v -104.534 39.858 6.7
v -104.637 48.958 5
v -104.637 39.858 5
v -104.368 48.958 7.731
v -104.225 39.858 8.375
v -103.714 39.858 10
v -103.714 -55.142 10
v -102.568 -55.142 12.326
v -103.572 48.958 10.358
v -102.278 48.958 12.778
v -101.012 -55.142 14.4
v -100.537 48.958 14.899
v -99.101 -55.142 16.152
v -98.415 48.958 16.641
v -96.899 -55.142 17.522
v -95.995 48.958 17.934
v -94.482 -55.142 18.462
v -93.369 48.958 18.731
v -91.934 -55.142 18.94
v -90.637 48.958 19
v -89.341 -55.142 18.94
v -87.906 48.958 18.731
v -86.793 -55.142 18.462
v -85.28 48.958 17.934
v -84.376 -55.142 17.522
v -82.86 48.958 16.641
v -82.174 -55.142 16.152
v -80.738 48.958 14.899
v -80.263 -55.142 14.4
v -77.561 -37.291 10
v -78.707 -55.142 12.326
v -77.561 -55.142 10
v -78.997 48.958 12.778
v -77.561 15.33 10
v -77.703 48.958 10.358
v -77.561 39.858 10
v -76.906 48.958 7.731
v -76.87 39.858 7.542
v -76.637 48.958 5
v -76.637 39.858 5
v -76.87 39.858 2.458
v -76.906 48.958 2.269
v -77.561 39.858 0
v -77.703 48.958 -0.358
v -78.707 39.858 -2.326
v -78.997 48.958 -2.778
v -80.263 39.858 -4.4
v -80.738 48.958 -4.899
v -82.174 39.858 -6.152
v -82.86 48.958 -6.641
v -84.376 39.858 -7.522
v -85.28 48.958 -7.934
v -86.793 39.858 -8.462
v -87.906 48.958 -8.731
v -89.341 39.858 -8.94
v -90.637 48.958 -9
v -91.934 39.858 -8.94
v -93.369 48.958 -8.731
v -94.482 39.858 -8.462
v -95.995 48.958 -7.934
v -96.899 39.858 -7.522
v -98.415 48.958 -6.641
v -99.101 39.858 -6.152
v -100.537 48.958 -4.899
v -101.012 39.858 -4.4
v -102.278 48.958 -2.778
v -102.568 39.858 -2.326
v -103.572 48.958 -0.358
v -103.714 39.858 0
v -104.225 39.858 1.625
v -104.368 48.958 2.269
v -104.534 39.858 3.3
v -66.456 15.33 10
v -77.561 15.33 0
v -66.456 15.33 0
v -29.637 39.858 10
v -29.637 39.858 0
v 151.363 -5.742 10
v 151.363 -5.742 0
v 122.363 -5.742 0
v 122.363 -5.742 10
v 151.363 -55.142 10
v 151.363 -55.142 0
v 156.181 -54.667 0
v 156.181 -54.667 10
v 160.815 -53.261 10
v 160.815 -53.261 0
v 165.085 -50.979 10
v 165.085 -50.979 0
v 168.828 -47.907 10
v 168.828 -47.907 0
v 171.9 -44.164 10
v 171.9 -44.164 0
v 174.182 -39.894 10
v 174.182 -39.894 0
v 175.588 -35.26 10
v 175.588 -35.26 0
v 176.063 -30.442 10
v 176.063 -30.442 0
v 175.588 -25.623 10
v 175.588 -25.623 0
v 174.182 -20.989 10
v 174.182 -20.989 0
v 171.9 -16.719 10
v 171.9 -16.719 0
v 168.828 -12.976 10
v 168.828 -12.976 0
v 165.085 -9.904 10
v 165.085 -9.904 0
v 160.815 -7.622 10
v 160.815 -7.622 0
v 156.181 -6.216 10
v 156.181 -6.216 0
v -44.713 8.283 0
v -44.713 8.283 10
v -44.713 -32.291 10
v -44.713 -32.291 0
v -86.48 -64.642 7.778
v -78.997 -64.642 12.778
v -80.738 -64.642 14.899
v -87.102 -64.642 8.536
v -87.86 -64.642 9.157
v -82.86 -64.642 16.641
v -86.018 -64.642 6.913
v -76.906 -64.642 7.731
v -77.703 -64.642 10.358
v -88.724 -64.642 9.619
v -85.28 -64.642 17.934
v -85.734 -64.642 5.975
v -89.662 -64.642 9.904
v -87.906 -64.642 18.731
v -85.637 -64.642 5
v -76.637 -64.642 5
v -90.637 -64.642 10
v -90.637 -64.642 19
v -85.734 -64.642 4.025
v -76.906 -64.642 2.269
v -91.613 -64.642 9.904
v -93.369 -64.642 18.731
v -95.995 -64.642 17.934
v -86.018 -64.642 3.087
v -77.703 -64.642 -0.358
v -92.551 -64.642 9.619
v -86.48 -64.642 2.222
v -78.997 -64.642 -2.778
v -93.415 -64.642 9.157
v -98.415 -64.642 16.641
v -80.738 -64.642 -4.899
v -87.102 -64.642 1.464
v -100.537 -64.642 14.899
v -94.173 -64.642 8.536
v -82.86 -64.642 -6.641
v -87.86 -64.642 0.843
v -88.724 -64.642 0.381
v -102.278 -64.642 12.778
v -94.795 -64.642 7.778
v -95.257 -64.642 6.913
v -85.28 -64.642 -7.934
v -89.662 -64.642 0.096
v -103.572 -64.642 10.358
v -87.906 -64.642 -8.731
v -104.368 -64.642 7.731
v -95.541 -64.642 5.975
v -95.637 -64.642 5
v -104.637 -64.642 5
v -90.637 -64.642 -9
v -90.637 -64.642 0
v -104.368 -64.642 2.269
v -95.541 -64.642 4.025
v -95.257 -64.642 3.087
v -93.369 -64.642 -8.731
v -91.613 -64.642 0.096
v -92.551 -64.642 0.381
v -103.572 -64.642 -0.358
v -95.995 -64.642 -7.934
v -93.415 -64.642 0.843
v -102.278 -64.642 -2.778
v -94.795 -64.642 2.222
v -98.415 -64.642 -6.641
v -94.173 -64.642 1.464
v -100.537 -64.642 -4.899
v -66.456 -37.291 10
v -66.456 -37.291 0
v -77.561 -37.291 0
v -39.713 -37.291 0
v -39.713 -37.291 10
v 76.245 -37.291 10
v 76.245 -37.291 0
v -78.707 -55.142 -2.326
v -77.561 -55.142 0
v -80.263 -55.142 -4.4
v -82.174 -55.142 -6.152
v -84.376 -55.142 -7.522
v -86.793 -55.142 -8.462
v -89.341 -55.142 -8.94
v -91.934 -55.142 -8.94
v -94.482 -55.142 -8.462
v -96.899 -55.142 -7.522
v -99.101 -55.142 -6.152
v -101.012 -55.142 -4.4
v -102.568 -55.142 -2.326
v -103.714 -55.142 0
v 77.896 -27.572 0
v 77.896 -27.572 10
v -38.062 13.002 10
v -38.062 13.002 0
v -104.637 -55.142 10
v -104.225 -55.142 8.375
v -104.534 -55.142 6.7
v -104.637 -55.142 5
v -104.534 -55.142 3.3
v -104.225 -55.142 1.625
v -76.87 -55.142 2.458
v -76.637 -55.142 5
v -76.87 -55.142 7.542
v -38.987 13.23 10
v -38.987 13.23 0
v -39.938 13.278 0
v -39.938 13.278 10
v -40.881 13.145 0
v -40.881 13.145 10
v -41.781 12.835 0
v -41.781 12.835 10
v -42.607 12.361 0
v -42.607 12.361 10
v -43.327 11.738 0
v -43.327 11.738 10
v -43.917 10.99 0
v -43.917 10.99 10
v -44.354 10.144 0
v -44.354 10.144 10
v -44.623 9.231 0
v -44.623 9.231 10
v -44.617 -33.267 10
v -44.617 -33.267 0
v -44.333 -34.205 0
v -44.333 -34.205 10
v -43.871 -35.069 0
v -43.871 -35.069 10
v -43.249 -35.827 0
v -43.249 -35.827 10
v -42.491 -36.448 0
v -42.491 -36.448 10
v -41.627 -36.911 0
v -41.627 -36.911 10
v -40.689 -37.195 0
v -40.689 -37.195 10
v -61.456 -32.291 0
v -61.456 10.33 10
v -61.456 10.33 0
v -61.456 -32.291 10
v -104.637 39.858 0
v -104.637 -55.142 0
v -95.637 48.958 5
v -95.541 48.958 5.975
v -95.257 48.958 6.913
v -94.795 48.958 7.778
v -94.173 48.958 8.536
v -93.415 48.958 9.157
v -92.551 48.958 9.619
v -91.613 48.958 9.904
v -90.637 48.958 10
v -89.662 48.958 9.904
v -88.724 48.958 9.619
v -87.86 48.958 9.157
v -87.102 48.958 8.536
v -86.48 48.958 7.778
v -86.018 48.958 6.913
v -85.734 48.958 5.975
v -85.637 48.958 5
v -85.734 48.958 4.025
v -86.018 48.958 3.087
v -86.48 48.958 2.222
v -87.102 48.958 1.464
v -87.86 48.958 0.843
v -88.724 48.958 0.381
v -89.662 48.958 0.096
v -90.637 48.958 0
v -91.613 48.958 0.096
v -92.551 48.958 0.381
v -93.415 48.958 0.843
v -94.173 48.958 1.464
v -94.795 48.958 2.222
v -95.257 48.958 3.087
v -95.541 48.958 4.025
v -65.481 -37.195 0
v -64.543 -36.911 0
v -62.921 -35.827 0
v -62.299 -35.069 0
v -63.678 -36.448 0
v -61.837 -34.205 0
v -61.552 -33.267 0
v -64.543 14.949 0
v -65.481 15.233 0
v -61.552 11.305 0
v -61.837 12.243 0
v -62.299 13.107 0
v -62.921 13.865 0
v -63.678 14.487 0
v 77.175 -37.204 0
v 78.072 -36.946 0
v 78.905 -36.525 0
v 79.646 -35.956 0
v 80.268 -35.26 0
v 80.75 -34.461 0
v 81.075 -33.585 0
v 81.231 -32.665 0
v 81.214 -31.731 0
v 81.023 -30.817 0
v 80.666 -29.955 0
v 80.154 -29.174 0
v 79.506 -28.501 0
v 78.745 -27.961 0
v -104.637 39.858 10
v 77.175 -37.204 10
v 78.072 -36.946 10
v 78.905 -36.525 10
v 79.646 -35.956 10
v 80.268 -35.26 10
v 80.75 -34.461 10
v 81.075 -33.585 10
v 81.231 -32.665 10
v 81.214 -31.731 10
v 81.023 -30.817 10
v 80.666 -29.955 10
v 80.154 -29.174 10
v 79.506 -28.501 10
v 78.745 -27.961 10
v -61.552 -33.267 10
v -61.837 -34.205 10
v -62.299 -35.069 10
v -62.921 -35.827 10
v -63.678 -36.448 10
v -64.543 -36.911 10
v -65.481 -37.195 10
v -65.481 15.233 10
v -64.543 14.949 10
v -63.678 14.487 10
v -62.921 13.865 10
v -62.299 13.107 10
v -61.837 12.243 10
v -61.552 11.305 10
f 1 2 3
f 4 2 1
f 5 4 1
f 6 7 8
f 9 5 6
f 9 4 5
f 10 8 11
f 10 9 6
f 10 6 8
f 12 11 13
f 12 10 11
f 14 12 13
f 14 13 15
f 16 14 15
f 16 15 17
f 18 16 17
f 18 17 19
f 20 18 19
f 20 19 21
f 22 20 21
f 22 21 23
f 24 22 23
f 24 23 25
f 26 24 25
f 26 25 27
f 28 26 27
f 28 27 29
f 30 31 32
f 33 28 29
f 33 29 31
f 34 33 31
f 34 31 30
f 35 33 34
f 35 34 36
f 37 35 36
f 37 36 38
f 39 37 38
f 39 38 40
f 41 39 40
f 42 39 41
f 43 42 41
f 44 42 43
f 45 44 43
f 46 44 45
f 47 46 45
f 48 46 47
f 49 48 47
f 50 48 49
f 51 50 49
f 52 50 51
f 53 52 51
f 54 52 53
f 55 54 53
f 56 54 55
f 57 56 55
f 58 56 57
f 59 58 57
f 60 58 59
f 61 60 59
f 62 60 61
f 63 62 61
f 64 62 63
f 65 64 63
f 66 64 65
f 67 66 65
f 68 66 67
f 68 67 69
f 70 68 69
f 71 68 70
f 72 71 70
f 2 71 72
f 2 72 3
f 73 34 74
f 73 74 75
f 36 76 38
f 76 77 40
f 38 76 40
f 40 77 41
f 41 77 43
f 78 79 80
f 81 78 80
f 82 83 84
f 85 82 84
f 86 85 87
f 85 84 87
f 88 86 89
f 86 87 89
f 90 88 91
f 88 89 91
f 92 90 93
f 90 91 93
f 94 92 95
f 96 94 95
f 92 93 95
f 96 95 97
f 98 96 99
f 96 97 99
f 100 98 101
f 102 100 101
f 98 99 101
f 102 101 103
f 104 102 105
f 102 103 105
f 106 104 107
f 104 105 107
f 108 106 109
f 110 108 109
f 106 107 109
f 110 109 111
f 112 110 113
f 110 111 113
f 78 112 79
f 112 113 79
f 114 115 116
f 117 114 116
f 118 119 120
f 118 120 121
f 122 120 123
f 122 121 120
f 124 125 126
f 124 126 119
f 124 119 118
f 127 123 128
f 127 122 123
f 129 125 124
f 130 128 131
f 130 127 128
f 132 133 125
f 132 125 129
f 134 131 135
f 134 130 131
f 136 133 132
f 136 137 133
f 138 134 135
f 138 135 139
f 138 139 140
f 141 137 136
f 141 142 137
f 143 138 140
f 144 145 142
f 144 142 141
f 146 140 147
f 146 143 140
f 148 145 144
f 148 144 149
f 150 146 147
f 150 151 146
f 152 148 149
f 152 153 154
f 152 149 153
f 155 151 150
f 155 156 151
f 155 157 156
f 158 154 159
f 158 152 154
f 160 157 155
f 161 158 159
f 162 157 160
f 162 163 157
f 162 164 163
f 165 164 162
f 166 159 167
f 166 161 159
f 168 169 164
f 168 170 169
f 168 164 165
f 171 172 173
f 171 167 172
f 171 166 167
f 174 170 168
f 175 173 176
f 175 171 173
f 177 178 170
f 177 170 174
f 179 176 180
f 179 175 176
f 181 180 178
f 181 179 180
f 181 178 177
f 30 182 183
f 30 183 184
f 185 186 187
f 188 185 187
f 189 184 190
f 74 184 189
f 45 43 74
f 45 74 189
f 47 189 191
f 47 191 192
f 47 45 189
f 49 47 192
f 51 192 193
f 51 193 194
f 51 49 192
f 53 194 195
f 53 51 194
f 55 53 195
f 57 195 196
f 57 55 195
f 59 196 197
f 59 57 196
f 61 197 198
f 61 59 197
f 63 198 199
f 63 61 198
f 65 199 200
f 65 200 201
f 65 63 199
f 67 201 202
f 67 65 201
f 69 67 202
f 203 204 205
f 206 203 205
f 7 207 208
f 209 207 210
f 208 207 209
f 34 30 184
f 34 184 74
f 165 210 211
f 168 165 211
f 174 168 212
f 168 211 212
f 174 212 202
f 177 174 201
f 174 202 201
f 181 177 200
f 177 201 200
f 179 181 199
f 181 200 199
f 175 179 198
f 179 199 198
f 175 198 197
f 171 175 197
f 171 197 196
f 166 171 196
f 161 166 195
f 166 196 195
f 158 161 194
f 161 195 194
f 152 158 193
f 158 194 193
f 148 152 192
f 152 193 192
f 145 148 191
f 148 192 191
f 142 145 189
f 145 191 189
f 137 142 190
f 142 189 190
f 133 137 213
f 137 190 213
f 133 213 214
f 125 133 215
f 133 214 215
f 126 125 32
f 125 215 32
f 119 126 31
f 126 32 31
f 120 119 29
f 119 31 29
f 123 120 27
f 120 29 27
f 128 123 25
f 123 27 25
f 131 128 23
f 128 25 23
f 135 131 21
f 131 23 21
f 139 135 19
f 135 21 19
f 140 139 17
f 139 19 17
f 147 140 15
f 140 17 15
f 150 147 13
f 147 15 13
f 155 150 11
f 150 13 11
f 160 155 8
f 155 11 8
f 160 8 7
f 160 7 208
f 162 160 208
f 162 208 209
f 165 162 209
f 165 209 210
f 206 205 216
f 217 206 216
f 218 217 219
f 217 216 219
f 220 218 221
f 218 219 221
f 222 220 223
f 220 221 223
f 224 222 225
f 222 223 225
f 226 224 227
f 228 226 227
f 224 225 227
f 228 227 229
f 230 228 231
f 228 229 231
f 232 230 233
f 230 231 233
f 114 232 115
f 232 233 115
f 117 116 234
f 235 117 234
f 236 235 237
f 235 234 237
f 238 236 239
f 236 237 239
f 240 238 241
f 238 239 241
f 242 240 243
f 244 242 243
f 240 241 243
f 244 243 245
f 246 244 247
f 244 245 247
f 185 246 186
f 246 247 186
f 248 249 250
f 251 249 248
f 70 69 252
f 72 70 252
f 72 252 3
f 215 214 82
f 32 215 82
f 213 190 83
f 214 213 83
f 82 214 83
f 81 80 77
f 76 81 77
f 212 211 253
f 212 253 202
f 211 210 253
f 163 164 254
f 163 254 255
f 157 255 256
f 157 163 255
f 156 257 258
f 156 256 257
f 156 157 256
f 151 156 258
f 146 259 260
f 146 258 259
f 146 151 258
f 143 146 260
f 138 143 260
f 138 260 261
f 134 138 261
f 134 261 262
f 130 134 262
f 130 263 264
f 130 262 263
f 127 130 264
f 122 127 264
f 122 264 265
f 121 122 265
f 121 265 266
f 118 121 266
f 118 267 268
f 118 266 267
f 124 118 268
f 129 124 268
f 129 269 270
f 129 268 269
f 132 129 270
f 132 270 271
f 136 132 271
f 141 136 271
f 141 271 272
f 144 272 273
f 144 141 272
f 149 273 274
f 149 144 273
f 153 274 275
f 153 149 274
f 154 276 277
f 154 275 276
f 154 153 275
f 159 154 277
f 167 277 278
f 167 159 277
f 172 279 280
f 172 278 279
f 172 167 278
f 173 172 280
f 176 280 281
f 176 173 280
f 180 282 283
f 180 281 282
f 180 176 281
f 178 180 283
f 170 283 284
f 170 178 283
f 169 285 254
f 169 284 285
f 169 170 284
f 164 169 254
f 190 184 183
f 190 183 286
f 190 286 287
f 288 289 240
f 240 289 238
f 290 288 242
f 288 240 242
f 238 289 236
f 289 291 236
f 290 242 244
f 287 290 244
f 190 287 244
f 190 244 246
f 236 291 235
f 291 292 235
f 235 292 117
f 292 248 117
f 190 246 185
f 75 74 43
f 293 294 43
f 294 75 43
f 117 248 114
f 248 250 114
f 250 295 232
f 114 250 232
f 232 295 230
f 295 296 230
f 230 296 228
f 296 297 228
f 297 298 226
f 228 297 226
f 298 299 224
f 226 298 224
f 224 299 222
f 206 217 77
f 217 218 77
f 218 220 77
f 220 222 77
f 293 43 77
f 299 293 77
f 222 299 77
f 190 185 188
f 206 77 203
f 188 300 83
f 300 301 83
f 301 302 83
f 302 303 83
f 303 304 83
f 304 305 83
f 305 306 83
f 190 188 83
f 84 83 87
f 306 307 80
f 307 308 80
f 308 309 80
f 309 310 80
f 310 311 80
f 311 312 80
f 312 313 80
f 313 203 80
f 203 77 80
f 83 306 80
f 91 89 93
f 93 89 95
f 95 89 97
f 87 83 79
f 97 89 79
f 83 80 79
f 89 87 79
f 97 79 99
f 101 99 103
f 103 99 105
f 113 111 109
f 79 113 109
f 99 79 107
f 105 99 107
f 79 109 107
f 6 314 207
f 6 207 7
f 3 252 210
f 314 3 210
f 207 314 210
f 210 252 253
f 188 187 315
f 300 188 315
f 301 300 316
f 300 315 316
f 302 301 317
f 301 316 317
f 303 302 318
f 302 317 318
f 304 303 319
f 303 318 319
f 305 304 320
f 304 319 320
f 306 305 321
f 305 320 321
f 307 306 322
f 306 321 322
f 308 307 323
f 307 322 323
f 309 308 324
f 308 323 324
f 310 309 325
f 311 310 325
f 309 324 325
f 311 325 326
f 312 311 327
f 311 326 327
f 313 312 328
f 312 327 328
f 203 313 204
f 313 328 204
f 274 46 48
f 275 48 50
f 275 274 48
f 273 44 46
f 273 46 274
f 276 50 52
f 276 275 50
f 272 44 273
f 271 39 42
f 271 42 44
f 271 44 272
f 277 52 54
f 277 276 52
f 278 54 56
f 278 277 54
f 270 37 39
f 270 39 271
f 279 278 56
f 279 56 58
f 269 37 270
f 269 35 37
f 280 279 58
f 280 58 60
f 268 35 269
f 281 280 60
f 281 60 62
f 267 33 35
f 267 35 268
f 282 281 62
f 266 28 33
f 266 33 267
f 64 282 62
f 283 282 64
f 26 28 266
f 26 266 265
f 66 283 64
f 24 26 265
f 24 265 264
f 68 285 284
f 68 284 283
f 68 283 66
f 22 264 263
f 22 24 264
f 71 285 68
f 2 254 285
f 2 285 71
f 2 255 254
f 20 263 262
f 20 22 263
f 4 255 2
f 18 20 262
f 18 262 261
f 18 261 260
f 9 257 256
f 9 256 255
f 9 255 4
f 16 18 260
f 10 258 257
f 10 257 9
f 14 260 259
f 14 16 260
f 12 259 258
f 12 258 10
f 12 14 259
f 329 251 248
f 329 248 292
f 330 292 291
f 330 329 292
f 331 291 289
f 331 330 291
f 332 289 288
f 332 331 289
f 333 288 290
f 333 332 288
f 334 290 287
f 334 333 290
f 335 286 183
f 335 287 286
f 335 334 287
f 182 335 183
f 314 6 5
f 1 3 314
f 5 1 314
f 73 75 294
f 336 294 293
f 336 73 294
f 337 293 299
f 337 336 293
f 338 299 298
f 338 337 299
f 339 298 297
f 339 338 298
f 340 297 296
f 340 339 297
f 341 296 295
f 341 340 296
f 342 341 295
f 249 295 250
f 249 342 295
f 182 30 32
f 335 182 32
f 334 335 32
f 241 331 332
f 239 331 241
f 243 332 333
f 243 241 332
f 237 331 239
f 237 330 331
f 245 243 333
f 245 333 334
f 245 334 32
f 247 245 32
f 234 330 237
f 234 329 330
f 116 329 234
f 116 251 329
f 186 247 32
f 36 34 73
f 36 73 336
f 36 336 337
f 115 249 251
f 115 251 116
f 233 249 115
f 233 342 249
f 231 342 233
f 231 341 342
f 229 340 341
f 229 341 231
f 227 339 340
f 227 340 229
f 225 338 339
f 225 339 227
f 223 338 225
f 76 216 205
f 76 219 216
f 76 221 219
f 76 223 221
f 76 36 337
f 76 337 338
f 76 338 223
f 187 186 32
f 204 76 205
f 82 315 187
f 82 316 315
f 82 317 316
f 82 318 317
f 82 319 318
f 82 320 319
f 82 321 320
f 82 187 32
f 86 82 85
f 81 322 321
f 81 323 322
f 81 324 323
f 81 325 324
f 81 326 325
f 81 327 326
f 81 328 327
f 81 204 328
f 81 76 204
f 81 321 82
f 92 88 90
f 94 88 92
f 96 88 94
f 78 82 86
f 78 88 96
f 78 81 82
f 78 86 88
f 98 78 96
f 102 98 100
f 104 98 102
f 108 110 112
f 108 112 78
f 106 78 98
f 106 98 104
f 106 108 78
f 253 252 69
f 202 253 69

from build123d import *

# Parameters (mm, degrees)
EXTRUDE_1_DEPTH          = 10
SKETCH_2_R               = 14
EXTRUDE_2_DEPTH          = 95
EXTRUDE_START            = 9.1
SKETCH_3_R               = 14
EXTRUDE_3_DEPTH          = 9.1
SKETCH_5_R               = 14
EXTRUDE_4_DEPTH          = 9.5
CUT_EXTRUDE_1_DEPTH      = 211.390033392
CUT_EXTRUDE_1_DEPTH_BACK = 211.390033392
SKETCH_6_R               = 5
CUT_EXTRUDE_2_DEPTH      = 19.5


with BuildPart() as part:
    # 스케치1 → 보스-돌출1 (new body)
    with BuildSketch(Plane.XY):
        with BuildLine():
            Line((-104.637493626, 39.858490566), (-104.637493626, -55.141509434))
            Line((-104.637493626, -55.141509434), (151.362506374, -55.141509434))
            ThreePointArc((151.362506374, -55.141509434), (176.062506374, -30.441509434), (151.362506374, -5.741509434))
            Line((151.362506374, -5.741509434), (122.362506374, -5.741509434))
            Line((122.362506374, -5.741509434), (-29.637493626, 39.858490566))
            Line((-29.637493626, 39.858490566), (-104.637493626, 39.858490566))
        make_face()
    extrude(amount=EXTRUDE_1_DEPTH)

    # 스케치2 → 보스-돌출2 (add)
    with BuildSketch(Plane(origin=(0, 39.858490566, 0), x_dir=(1, 0, 0), z_dir=(0, 1, 0))):
        with Locations((-90.637493626, -5)):
            Circle(SKETCH_2_R)
    extrude(amount=-EXTRUDE_2_DEPTH)

    # 스케치3 → 보스-돌출3 (add)
    with BuildSketch(Plane(origin=(0, 39.858490566, 0), x_dir=(1, 0, 0), z_dir=(0, 1, 0)).offset(EXTRUDE_START)):
        with Locations((-90.637493626, -5)):
            Circle(SKETCH_3_R)
    extrude(amount=-EXTRUDE_3_DEPTH)

    # 스케치5 → 보스-돌출4 (add)
    with BuildSketch(Plane.XZ.offset(55.141509434)):
        with Locations((-90.637493626, 5)):
            Circle(SKETCH_5_R)
    extrude(amount=EXTRUDE_4_DEPTH)

    # 스케치6 → 컷-돌출1 (cut, two sides: drawn at the far end of the back side and taken through both)
    with BuildSketch(Plane(origin=(0, 48.958490566, 0), x_dir=(1, 0, 0), z_dir=(0, 1, 0)).offset(-CUT_EXTRUDE_1_DEPTH_BACK)):
        with Locations((-90.637493626, -5)):
            Circle(SKETCH_6_R)
    extrude(amount=CUT_EXTRUDE_1_DEPTH + CUT_EXTRUDE_1_DEPTH_BACK, mode=Mode.SUBTRACT)

    # 스케치7 → 컷-돌출2 (cut)
    with BuildSketch(Plane.XY.offset(10)):
        with BuildLine():
            Line((-77.560796795, 15.329522676), (-66.456337958, 15.329522676))
            ThreePointArc((-66.456337958, 15.329522676), (-62.920804052, 13.865056582), (-61.456337958, 10.329522676))
            Line((-61.456337958, 10.329522676), (-61.456337958, -32.291143793))
            ThreePointArc((-61.456337958, -32.291143793), (-62.920804052, -35.826677699), (-66.456337958, -37.291143793))
            Line((-66.456337958, -37.291143793), (-77.560796795, -37.291143793))
            Line((-77.560796795, -37.291143793), (-77.560796795, 15.329522676))
        make_face()
        with BuildLine():
            Line((-44.713398627, 8.282778838), (-44.713398627, -32.291143793))
            ThreePointArc((-44.713398627, -32.291143793), (-43.248932532, -35.826677699), (-39.713398627, -37.291143793))
            Line((-39.713398627, -37.291143793), (76.245027984, -37.291143793))
            ThreePointArc((76.245027984, -37.291143793), (81.1743885, -33.128642988), (77.896362169, -27.571705753))
            Line((77.896362169, -27.571705753), (-38.062064442, 13.002216878))
            ThreePointArc((-38.062064442, 13.002216878), (-42.606781515, 12.360564446), (-44.713398627, 8.282778838))
        make_face()
    extrude(amount=-CUT_EXTRUDE_2_DEPTH, mode=Mode.SUBTRACT)


solid = part.part
